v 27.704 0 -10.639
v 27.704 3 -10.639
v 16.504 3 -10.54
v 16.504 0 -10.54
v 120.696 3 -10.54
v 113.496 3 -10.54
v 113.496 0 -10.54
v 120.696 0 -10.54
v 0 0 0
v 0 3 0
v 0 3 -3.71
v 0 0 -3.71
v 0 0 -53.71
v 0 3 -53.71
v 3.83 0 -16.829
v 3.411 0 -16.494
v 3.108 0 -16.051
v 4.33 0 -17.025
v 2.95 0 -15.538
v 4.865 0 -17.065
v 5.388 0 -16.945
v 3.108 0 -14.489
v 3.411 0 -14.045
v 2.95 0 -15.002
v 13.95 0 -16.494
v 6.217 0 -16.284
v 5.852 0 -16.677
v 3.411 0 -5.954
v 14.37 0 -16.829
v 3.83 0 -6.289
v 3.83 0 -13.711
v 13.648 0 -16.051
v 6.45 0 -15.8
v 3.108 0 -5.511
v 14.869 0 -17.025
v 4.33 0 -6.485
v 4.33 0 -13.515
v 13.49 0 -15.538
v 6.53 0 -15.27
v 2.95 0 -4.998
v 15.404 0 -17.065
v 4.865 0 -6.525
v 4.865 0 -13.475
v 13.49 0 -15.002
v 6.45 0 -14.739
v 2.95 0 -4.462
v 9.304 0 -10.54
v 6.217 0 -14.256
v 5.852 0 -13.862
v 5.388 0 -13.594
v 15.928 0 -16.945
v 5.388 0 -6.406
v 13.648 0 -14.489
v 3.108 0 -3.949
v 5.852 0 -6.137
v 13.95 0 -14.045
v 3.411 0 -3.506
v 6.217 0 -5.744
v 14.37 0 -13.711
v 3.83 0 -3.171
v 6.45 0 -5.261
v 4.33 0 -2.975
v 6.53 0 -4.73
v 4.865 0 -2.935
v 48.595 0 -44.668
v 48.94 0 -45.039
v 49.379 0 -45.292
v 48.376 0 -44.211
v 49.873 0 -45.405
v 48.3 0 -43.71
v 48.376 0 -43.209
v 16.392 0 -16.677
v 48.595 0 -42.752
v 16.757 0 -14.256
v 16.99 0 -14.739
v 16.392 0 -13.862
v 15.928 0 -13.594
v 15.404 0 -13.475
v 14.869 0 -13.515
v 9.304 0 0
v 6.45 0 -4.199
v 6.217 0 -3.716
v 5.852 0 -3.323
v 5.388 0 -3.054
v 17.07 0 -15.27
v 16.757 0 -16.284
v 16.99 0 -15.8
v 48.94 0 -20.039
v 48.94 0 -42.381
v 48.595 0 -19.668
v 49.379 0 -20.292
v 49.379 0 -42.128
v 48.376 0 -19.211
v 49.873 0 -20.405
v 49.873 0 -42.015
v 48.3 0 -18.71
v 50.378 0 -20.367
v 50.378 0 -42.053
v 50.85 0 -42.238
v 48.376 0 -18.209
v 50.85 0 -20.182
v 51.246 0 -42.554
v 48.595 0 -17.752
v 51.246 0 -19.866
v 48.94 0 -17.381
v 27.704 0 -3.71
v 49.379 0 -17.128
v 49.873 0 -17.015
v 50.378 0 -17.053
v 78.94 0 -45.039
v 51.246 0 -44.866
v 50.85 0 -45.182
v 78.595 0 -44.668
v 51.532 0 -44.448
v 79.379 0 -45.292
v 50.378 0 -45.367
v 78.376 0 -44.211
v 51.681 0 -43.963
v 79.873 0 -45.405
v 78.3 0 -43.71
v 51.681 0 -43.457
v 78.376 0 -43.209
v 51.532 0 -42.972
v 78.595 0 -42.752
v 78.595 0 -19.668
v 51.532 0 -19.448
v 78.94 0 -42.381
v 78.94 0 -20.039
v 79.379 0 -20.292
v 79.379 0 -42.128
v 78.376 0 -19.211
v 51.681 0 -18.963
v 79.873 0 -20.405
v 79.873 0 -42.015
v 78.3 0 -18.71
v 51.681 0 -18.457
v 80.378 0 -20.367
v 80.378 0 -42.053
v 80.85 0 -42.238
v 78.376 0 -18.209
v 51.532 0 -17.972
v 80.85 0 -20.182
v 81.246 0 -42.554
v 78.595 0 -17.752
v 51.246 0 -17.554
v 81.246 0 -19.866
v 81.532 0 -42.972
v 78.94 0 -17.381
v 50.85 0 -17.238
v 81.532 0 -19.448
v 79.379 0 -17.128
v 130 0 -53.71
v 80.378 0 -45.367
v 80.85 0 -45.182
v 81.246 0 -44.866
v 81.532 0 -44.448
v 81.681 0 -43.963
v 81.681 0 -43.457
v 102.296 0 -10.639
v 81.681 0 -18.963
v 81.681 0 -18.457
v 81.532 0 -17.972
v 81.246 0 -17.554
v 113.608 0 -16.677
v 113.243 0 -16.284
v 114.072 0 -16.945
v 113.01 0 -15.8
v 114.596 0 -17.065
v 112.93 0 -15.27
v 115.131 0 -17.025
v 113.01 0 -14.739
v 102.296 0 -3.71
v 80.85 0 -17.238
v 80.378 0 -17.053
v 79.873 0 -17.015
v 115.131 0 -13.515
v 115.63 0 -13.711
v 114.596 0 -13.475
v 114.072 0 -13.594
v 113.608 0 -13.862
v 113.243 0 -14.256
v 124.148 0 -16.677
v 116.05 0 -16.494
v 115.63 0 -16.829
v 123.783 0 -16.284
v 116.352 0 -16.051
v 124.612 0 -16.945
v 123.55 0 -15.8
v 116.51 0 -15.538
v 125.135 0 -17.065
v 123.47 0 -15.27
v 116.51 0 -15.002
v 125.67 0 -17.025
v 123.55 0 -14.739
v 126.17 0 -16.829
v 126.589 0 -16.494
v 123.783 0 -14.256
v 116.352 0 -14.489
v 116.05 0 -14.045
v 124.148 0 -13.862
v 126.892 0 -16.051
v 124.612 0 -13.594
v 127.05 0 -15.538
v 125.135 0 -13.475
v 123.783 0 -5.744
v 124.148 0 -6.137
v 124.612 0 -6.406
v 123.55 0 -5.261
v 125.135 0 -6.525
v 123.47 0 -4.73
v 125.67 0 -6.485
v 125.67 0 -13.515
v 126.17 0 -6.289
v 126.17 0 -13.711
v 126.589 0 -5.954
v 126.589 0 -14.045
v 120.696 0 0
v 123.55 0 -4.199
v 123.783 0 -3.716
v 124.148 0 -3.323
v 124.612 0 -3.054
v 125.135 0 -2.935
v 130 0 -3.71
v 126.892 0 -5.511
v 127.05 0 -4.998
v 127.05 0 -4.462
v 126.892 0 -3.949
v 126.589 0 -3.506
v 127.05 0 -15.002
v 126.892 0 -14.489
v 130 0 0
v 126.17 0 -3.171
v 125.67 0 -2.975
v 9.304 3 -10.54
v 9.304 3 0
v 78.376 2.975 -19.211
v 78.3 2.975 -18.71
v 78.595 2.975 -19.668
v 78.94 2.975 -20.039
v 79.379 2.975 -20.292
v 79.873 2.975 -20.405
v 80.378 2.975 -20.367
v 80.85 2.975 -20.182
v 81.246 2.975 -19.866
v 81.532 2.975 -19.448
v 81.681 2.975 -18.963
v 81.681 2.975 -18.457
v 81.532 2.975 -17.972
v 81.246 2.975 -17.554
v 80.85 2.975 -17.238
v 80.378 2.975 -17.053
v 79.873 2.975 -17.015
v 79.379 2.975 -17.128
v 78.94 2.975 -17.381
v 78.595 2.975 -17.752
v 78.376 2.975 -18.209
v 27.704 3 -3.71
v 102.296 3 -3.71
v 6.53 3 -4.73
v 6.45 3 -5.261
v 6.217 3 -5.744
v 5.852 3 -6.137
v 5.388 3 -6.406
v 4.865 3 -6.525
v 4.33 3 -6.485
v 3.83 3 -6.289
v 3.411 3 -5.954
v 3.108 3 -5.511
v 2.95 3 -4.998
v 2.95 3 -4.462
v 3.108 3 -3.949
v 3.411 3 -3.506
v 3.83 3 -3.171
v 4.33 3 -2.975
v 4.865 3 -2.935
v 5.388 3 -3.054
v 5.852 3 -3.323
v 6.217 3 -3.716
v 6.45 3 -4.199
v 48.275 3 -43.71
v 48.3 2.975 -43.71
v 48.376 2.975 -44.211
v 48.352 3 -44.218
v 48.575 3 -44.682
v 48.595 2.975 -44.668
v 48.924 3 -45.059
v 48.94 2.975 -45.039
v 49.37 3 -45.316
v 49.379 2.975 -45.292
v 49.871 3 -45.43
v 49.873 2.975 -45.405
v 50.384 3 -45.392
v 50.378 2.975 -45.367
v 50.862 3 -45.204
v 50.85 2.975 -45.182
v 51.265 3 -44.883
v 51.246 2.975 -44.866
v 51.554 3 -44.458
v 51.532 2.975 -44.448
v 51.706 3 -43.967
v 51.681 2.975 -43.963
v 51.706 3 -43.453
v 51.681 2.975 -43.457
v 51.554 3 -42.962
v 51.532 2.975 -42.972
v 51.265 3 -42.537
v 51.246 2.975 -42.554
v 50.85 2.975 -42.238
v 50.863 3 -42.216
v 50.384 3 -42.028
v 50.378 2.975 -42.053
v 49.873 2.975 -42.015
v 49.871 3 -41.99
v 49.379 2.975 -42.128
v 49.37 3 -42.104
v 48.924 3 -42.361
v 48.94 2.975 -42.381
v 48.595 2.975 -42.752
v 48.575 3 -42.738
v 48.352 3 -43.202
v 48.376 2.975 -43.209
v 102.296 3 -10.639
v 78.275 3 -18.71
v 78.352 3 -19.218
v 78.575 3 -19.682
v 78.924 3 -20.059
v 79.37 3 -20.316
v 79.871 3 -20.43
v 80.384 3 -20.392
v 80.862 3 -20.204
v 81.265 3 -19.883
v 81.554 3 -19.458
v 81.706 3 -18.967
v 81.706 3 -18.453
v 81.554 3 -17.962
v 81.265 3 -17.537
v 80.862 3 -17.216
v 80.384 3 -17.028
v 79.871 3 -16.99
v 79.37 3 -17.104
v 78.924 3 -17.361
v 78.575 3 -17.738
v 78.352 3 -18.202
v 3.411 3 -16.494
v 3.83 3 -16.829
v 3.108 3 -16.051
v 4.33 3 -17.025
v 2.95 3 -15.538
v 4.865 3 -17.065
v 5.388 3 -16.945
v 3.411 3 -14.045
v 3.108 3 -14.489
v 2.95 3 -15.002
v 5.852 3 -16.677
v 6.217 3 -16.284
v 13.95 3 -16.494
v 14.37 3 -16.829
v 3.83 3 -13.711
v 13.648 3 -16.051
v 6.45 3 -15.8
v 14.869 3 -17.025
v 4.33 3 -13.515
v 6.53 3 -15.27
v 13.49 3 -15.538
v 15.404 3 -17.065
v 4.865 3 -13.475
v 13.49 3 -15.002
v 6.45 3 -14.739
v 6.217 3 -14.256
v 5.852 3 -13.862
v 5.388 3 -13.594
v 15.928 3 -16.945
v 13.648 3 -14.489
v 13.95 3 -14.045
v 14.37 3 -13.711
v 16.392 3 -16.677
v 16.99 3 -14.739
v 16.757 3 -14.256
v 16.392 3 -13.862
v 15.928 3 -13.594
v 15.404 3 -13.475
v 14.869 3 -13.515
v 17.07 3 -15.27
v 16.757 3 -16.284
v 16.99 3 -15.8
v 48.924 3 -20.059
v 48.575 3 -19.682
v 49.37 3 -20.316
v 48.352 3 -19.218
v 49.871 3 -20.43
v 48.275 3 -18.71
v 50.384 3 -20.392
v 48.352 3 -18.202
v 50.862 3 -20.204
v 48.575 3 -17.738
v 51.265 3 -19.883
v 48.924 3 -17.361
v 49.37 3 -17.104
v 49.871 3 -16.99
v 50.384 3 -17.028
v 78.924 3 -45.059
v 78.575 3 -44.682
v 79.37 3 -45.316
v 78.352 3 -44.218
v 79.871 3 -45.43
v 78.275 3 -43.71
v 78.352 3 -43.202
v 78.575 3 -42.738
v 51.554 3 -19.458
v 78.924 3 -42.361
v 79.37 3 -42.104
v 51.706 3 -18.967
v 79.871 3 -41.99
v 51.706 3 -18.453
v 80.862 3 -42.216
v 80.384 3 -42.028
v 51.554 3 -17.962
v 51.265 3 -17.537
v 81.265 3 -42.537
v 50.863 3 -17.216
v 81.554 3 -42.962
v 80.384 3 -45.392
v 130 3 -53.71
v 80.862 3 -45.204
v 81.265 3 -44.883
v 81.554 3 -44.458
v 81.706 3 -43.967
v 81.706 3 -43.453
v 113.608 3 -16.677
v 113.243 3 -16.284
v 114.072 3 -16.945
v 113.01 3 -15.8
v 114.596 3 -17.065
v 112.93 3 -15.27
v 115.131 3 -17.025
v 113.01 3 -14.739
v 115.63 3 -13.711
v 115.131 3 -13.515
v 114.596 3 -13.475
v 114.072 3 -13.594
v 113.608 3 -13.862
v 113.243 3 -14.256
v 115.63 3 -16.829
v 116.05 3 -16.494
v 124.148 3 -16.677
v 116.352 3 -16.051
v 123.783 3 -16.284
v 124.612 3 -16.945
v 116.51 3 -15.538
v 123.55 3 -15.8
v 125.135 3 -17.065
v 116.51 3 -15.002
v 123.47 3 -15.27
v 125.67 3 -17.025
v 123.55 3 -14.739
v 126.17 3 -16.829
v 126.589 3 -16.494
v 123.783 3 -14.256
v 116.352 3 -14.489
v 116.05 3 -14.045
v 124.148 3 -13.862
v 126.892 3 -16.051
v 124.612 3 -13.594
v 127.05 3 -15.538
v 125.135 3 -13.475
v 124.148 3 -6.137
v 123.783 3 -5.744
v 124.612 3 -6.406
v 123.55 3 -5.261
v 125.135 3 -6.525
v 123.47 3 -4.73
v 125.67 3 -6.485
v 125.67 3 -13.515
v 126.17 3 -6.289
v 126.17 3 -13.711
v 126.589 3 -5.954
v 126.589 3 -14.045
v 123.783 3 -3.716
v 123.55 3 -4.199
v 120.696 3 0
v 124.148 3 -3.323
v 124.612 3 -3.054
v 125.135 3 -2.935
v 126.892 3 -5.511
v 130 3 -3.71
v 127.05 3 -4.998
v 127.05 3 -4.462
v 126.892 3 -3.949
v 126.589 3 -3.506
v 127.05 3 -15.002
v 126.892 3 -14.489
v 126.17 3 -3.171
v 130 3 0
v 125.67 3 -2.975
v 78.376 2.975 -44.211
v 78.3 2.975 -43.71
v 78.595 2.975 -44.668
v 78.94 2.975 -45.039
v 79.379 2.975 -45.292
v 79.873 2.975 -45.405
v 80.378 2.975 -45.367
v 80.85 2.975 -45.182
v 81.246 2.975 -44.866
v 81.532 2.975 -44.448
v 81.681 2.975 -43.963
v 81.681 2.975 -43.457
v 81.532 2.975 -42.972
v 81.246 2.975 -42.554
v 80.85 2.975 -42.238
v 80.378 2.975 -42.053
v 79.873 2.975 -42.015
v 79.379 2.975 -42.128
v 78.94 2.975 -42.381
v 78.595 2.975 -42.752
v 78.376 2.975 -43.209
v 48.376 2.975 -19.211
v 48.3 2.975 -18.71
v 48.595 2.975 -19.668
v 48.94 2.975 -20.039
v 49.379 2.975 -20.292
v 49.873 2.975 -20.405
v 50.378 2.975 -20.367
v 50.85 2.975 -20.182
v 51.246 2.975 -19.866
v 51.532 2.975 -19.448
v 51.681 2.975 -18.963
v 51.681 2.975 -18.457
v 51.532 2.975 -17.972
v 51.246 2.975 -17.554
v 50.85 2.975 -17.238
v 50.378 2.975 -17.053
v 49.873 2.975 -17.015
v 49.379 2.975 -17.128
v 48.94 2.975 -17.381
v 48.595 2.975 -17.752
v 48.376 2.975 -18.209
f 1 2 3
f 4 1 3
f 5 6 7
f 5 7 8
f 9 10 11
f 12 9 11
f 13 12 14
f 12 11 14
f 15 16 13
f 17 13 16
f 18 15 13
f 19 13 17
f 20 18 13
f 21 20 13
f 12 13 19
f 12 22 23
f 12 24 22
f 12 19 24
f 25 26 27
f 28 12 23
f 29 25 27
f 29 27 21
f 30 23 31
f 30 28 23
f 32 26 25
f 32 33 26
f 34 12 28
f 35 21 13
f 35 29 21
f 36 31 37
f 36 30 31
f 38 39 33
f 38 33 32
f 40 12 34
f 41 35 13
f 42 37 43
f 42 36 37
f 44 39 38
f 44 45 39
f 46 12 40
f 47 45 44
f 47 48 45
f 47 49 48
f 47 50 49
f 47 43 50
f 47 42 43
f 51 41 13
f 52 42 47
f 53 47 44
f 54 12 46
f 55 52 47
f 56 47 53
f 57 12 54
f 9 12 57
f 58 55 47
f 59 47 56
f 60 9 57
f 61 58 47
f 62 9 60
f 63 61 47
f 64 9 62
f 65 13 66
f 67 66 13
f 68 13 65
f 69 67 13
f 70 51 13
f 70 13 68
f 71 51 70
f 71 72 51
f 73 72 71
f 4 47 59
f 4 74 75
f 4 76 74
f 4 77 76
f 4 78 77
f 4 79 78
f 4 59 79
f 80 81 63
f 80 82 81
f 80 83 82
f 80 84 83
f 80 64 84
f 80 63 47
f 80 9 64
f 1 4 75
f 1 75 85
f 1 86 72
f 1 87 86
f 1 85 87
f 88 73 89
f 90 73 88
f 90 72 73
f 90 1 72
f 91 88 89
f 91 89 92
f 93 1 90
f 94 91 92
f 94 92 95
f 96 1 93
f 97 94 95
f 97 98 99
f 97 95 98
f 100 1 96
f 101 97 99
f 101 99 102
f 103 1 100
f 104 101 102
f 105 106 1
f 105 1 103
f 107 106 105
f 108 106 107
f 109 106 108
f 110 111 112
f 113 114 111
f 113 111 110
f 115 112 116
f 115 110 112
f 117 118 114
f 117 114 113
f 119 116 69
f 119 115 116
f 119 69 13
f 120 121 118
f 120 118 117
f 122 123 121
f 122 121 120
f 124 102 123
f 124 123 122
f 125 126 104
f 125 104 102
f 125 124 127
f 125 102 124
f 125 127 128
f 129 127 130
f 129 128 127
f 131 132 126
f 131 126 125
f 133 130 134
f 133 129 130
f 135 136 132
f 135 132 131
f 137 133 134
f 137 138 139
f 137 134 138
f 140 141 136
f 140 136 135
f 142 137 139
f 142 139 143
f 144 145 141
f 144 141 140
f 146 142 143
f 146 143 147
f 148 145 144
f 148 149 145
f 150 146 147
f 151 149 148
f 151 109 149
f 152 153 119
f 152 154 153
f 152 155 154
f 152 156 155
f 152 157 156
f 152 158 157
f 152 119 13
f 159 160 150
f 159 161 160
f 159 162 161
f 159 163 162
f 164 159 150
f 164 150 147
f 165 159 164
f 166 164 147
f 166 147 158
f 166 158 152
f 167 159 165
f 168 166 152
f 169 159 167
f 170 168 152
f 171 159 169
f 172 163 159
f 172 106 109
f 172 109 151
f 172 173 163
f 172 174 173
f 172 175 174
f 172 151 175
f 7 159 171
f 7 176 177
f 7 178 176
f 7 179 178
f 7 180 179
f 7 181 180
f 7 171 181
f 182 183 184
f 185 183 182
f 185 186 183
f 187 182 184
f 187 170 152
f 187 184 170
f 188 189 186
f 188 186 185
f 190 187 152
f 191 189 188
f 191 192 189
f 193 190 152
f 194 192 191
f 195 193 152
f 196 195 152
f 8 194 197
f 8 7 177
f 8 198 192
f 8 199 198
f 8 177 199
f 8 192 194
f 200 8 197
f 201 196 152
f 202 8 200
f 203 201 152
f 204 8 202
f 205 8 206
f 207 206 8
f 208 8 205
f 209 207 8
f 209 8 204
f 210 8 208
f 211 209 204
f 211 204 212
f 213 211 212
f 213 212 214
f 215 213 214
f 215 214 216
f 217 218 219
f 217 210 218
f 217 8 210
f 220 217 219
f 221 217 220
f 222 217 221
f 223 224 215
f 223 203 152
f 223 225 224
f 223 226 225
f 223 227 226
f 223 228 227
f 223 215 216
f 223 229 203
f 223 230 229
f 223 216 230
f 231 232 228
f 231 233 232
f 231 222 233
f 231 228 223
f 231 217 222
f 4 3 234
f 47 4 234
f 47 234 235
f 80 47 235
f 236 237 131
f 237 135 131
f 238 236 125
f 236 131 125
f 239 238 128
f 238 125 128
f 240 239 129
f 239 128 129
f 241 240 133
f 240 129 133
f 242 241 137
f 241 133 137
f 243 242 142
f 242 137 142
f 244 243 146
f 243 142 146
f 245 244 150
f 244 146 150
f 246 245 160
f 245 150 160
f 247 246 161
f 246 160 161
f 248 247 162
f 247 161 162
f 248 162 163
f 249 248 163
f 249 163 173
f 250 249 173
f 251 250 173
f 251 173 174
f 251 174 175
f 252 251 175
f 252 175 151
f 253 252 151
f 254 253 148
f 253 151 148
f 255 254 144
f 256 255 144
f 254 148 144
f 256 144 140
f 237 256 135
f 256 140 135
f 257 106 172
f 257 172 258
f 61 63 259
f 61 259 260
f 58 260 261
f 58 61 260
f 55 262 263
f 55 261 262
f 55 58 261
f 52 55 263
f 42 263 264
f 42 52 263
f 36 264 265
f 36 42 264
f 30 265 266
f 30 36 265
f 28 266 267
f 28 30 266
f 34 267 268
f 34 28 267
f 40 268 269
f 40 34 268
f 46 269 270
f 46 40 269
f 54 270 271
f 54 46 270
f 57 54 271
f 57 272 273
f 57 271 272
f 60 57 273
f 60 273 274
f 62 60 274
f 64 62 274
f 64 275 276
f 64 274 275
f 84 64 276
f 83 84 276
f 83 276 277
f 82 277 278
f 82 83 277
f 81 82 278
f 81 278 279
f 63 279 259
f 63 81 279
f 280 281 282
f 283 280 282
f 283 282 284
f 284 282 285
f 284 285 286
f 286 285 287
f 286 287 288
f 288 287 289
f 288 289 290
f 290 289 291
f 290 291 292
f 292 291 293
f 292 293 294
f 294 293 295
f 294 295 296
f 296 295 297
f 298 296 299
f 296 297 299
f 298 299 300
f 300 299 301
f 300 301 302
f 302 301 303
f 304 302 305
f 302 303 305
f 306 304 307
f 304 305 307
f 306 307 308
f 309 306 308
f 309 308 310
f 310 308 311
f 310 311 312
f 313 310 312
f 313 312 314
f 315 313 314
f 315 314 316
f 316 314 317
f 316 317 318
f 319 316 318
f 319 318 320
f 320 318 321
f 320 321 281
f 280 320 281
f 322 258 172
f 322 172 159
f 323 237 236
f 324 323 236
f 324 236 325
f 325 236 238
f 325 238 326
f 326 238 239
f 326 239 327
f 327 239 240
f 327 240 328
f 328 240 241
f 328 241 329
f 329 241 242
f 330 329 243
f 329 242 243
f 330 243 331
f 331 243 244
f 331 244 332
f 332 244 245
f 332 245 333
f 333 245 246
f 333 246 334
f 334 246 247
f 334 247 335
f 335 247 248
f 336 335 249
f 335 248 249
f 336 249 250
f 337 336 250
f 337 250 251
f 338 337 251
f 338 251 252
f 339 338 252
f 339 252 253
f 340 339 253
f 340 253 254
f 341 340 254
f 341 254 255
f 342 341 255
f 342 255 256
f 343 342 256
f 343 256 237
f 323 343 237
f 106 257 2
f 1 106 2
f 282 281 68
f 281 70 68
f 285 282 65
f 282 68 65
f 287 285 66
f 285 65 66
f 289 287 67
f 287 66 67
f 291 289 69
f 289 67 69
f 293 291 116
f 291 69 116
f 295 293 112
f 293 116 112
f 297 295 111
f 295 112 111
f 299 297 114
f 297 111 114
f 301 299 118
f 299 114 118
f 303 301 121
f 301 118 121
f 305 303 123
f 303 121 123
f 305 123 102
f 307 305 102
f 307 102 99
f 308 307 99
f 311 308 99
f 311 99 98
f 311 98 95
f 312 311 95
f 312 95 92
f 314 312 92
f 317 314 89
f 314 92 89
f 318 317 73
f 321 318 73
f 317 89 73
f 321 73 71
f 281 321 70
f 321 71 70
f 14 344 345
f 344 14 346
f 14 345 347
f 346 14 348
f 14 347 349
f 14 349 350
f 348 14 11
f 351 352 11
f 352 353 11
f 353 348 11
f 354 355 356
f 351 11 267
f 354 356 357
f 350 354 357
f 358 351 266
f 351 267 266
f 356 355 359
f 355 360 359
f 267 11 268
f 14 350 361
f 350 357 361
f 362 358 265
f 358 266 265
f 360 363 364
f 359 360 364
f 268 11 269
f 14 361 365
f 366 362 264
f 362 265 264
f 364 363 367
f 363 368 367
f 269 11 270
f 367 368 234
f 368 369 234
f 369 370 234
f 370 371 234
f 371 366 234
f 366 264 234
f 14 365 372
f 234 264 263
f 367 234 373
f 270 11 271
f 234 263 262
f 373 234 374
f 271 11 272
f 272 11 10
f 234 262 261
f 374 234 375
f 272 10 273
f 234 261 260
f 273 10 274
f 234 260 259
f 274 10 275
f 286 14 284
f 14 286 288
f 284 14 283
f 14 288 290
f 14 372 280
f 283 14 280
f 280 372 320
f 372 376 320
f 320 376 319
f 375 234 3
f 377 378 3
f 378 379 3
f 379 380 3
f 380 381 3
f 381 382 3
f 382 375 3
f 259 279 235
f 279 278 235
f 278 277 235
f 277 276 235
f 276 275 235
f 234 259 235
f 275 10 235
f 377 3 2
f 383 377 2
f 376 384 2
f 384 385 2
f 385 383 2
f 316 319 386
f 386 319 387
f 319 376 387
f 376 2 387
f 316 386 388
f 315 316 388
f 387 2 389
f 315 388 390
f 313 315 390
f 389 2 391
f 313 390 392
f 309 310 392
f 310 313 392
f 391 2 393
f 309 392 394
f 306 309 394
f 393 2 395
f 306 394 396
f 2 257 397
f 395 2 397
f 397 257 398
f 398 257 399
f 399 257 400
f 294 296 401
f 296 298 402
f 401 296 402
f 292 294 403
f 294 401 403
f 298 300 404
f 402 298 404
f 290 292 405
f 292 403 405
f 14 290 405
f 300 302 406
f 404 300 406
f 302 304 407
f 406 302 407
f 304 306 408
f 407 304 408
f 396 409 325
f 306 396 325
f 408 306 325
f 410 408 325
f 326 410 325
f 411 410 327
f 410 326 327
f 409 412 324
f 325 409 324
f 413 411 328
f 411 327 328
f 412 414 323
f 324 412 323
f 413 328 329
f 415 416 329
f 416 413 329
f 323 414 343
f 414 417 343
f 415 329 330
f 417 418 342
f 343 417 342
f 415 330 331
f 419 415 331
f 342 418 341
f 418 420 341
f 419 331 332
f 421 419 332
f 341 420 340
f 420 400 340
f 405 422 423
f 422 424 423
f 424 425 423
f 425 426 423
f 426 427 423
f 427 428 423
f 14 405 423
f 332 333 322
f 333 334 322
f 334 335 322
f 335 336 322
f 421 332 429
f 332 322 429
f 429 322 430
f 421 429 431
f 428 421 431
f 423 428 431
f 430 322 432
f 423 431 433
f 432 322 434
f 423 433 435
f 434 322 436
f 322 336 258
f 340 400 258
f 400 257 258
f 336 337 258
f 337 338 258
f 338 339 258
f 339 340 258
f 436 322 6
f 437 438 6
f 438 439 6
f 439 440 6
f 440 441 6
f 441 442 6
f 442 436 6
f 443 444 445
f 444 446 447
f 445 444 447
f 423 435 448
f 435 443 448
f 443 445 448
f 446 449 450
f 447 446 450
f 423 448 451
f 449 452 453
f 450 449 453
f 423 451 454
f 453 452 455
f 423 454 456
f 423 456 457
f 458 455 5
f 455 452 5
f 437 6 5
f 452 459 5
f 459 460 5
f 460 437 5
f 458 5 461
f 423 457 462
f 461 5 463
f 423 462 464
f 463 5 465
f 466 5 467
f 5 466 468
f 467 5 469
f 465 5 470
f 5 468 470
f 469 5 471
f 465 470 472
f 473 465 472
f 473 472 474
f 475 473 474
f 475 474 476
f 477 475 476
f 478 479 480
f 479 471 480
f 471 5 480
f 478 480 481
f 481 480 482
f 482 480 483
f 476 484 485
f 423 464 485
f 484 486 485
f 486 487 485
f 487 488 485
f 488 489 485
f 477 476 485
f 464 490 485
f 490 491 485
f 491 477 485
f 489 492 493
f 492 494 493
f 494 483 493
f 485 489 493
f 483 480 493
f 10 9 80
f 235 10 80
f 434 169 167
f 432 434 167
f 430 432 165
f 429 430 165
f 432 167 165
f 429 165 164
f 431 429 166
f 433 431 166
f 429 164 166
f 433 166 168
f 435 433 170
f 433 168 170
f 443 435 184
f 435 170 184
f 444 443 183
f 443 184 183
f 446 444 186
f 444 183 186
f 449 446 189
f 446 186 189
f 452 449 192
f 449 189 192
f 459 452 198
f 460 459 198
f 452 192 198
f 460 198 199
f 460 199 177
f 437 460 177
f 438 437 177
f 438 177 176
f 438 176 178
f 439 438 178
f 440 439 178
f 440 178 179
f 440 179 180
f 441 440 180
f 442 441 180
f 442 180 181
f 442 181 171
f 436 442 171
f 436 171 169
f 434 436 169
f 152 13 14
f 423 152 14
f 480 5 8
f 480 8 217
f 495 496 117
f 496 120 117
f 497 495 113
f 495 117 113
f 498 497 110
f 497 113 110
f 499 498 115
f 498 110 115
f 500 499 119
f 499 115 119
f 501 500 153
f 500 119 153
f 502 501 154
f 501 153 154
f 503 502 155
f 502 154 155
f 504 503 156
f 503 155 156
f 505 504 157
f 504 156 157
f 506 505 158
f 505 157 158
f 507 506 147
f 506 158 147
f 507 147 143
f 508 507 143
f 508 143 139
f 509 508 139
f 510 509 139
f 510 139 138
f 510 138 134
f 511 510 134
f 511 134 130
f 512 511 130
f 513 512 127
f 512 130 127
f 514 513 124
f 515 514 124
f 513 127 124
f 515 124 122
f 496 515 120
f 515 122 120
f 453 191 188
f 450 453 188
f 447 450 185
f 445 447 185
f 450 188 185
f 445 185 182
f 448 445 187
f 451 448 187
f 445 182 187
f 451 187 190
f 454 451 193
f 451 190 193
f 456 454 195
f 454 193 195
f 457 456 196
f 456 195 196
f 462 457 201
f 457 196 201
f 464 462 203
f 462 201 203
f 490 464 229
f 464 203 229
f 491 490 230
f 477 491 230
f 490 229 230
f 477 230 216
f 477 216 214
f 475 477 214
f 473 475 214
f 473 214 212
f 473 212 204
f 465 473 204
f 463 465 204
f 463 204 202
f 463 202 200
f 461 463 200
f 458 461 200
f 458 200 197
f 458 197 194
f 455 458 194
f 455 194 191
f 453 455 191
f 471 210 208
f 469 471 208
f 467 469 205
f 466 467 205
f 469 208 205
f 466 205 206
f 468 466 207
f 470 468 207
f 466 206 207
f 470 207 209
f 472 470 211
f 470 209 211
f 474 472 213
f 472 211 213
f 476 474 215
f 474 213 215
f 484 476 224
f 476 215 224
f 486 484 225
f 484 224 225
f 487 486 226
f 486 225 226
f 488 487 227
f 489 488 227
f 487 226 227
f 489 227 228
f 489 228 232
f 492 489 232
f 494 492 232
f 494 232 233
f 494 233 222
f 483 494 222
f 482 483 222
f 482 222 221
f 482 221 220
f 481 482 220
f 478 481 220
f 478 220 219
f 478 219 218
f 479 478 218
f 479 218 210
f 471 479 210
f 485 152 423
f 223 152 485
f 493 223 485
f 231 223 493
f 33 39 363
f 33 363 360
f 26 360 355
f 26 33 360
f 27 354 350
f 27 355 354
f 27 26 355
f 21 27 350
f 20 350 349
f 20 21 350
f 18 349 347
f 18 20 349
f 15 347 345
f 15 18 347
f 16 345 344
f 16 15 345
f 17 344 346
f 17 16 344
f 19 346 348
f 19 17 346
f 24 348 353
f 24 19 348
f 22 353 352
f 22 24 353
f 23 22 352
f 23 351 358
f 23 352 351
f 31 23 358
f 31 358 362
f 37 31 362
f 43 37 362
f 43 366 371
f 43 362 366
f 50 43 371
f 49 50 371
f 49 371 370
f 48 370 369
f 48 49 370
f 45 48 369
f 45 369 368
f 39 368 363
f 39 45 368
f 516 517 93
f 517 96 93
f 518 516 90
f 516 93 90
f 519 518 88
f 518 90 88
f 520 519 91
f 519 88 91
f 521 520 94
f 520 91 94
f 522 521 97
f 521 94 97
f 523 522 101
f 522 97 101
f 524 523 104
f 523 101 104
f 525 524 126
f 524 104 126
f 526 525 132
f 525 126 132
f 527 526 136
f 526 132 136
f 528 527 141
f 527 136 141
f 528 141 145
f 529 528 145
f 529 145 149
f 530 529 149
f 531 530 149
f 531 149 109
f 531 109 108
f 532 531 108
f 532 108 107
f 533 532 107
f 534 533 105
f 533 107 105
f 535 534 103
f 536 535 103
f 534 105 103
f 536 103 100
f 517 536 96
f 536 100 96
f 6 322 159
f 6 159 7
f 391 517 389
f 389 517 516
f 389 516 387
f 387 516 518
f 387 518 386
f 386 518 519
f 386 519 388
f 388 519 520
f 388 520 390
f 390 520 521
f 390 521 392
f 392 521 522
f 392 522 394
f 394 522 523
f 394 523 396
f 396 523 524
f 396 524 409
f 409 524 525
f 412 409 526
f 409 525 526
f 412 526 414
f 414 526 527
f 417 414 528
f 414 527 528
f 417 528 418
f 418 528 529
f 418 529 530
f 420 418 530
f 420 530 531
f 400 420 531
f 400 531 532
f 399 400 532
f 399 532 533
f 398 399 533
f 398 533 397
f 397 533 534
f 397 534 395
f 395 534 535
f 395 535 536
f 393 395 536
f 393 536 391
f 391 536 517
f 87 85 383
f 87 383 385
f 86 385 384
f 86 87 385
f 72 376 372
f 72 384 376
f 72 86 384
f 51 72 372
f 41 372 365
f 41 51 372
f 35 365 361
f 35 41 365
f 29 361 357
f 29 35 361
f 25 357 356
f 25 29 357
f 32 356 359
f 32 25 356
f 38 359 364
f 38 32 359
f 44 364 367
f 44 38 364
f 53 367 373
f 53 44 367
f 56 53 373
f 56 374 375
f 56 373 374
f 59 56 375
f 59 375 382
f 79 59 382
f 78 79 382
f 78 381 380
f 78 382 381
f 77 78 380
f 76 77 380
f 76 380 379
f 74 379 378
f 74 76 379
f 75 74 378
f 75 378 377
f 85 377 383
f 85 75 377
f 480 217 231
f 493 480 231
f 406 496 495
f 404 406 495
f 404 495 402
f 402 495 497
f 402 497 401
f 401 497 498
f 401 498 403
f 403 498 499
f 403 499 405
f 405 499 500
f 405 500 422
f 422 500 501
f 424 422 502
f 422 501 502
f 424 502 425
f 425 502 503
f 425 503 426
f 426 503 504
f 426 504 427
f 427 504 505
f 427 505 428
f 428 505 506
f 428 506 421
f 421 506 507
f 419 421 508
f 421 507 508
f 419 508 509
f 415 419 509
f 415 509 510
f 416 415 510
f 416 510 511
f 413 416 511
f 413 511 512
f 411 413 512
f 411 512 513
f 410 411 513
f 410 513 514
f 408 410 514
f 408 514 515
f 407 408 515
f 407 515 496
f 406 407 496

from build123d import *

# Parameters (mm, degrees)
SKETCH1_W                      = 50
SKETCH1_H                      = 3
BOSS_EXTRUDE1_DEPTH            = 130
M3_CLEARANCE_HOLE2_D           = 3.4
M3_CLEARANCE_HOLE2_CSINK_D     = 3.45
M3_CLEARANCE_HOLE2_CSINK_ANGLE = 90
SKETCH7_W                      = 21.804410209
SKETCH7_H                      = 3.710121499
BOSS_EXTRUDE2_DEPTH            = 3
CUT_EXTRUDE1_DEPTH             = 141.690312744
M3_CLEARANCE_HOLE3_D           = 3.6


with BuildPart() as part:
    # Sketch1 → Boss-Extrude1 (new body)
    with BuildSketch(Plane(origin=(0, 0, 0), x_dir=(0, 0, -1), z_dir=(1, 0, 0))):
        with Locations((28.71, 1.5)):
            Rectangle(SKETCH1_W, SKETCH1_H)
    extrude(amount=BOSS_EXTRUDE1_DEPTH)

    # M3 Clearance Hole2 (through all)
    with Locations(Plane(origin=(0, 3, 0), x_dir=(1, 0, 0), z_dir=(0, 1, 0))):
        with Locations((80, 18.71), (50, 43.71), (80, 43.71), (50, 18.71)):
            CounterSinkHole(M3_CLEARANCE_HOLE2_D / 2, M3_CLEARANCE_HOLE2_CSINK_D / 2, counter_sink_angle=M3_CLEARANCE_HOLE2_CSINK_ANGLE)

    # Sketch7 → Boss-Extrude2 (add)
    with BuildSketch(Plane.XZ):
        with Locations((119.097794896, -1.854939251)):
            Rectangle(SKETCH7_W, SKETCH7_H)
        with Locations((10.902205105, -1.854939251)):
            Rectangle(SKETCH7_W, SKETCH7_H)
    extrude(amount=-BOSS_EXTRUDE2_DEPTH)

    # Sketch9 → Cut-Extrude1 (cut, through all)
    # profile 1 of 2: a face of its own
    with BuildSketch(Plane(origin=(0, 3, 0), x_dir=(1, 0, 0), z_dir=(0, 1, 0))):
        Polygon((102.295589791, 0.840390735), (102.295589791, 10.639411436), (113.496480192, 10.53967858), (120.695589791, 10.53967858), (120.695589791, -4.617254568), align=None)
        Polygon((120.495589791, 10.33967858), (113.495589791, 10.33967858), (102.495589791, 10.437622706), (102.495589791, 0.989680888), (120.495589791, -4.349319951), align=None, mode=Mode.SUBTRACT)
    # profile 2 of 2: a face of its own
    with BuildSketch(Plane(origin=(0, 3, 0), x_dir=(1, 0, 0), z_dir=(0, 1, 0))):
        Polygon((9.304410209, 10.53967858), (9.304410209, -4.617254568), (27.704410209, 0.840390735), (27.704410209, 10.639411436), (16.503519826, 10.53967858), align=None)
    extrude(amount=-CUT_EXTRUDE1_DEPTH, mode=Mode.SUBTRACT)


with BuildPart() as cut_extrude1_kept_piece:
    # of the separate pieces the step leaves, the one the design keeps (cut_extrude1_pieces_kept)
    add(part.part.solids().sort_by_distance((27.704410209, 3, -3.71))[0])

    # M3 Clearance Hole3 (through all)
    with Locations(Plane(origin=(0, 3, 0), x_dir=(1, 0, 0), z_dir=(0, 1, 0))):
        with Locations((125.269900039, 4.729978462), (125.269900039, 15.269778541), (114.730099961, 15.269778541)):
            m3_clearance_hole3 = Hole(M3_CLEARANCE_HOLE3_D / 2)

    # Mirror1: M3 Clearance Hole3 across plane
    add(m3_clearance_hole3.mirror(Plane(origin=(65, 0, 0), x_dir=(0, 0, 1), z_dir=(1, 0, 0))), mode=Mode.SUBTRACT)


solid = cut_extrude1_kept_piece.part
